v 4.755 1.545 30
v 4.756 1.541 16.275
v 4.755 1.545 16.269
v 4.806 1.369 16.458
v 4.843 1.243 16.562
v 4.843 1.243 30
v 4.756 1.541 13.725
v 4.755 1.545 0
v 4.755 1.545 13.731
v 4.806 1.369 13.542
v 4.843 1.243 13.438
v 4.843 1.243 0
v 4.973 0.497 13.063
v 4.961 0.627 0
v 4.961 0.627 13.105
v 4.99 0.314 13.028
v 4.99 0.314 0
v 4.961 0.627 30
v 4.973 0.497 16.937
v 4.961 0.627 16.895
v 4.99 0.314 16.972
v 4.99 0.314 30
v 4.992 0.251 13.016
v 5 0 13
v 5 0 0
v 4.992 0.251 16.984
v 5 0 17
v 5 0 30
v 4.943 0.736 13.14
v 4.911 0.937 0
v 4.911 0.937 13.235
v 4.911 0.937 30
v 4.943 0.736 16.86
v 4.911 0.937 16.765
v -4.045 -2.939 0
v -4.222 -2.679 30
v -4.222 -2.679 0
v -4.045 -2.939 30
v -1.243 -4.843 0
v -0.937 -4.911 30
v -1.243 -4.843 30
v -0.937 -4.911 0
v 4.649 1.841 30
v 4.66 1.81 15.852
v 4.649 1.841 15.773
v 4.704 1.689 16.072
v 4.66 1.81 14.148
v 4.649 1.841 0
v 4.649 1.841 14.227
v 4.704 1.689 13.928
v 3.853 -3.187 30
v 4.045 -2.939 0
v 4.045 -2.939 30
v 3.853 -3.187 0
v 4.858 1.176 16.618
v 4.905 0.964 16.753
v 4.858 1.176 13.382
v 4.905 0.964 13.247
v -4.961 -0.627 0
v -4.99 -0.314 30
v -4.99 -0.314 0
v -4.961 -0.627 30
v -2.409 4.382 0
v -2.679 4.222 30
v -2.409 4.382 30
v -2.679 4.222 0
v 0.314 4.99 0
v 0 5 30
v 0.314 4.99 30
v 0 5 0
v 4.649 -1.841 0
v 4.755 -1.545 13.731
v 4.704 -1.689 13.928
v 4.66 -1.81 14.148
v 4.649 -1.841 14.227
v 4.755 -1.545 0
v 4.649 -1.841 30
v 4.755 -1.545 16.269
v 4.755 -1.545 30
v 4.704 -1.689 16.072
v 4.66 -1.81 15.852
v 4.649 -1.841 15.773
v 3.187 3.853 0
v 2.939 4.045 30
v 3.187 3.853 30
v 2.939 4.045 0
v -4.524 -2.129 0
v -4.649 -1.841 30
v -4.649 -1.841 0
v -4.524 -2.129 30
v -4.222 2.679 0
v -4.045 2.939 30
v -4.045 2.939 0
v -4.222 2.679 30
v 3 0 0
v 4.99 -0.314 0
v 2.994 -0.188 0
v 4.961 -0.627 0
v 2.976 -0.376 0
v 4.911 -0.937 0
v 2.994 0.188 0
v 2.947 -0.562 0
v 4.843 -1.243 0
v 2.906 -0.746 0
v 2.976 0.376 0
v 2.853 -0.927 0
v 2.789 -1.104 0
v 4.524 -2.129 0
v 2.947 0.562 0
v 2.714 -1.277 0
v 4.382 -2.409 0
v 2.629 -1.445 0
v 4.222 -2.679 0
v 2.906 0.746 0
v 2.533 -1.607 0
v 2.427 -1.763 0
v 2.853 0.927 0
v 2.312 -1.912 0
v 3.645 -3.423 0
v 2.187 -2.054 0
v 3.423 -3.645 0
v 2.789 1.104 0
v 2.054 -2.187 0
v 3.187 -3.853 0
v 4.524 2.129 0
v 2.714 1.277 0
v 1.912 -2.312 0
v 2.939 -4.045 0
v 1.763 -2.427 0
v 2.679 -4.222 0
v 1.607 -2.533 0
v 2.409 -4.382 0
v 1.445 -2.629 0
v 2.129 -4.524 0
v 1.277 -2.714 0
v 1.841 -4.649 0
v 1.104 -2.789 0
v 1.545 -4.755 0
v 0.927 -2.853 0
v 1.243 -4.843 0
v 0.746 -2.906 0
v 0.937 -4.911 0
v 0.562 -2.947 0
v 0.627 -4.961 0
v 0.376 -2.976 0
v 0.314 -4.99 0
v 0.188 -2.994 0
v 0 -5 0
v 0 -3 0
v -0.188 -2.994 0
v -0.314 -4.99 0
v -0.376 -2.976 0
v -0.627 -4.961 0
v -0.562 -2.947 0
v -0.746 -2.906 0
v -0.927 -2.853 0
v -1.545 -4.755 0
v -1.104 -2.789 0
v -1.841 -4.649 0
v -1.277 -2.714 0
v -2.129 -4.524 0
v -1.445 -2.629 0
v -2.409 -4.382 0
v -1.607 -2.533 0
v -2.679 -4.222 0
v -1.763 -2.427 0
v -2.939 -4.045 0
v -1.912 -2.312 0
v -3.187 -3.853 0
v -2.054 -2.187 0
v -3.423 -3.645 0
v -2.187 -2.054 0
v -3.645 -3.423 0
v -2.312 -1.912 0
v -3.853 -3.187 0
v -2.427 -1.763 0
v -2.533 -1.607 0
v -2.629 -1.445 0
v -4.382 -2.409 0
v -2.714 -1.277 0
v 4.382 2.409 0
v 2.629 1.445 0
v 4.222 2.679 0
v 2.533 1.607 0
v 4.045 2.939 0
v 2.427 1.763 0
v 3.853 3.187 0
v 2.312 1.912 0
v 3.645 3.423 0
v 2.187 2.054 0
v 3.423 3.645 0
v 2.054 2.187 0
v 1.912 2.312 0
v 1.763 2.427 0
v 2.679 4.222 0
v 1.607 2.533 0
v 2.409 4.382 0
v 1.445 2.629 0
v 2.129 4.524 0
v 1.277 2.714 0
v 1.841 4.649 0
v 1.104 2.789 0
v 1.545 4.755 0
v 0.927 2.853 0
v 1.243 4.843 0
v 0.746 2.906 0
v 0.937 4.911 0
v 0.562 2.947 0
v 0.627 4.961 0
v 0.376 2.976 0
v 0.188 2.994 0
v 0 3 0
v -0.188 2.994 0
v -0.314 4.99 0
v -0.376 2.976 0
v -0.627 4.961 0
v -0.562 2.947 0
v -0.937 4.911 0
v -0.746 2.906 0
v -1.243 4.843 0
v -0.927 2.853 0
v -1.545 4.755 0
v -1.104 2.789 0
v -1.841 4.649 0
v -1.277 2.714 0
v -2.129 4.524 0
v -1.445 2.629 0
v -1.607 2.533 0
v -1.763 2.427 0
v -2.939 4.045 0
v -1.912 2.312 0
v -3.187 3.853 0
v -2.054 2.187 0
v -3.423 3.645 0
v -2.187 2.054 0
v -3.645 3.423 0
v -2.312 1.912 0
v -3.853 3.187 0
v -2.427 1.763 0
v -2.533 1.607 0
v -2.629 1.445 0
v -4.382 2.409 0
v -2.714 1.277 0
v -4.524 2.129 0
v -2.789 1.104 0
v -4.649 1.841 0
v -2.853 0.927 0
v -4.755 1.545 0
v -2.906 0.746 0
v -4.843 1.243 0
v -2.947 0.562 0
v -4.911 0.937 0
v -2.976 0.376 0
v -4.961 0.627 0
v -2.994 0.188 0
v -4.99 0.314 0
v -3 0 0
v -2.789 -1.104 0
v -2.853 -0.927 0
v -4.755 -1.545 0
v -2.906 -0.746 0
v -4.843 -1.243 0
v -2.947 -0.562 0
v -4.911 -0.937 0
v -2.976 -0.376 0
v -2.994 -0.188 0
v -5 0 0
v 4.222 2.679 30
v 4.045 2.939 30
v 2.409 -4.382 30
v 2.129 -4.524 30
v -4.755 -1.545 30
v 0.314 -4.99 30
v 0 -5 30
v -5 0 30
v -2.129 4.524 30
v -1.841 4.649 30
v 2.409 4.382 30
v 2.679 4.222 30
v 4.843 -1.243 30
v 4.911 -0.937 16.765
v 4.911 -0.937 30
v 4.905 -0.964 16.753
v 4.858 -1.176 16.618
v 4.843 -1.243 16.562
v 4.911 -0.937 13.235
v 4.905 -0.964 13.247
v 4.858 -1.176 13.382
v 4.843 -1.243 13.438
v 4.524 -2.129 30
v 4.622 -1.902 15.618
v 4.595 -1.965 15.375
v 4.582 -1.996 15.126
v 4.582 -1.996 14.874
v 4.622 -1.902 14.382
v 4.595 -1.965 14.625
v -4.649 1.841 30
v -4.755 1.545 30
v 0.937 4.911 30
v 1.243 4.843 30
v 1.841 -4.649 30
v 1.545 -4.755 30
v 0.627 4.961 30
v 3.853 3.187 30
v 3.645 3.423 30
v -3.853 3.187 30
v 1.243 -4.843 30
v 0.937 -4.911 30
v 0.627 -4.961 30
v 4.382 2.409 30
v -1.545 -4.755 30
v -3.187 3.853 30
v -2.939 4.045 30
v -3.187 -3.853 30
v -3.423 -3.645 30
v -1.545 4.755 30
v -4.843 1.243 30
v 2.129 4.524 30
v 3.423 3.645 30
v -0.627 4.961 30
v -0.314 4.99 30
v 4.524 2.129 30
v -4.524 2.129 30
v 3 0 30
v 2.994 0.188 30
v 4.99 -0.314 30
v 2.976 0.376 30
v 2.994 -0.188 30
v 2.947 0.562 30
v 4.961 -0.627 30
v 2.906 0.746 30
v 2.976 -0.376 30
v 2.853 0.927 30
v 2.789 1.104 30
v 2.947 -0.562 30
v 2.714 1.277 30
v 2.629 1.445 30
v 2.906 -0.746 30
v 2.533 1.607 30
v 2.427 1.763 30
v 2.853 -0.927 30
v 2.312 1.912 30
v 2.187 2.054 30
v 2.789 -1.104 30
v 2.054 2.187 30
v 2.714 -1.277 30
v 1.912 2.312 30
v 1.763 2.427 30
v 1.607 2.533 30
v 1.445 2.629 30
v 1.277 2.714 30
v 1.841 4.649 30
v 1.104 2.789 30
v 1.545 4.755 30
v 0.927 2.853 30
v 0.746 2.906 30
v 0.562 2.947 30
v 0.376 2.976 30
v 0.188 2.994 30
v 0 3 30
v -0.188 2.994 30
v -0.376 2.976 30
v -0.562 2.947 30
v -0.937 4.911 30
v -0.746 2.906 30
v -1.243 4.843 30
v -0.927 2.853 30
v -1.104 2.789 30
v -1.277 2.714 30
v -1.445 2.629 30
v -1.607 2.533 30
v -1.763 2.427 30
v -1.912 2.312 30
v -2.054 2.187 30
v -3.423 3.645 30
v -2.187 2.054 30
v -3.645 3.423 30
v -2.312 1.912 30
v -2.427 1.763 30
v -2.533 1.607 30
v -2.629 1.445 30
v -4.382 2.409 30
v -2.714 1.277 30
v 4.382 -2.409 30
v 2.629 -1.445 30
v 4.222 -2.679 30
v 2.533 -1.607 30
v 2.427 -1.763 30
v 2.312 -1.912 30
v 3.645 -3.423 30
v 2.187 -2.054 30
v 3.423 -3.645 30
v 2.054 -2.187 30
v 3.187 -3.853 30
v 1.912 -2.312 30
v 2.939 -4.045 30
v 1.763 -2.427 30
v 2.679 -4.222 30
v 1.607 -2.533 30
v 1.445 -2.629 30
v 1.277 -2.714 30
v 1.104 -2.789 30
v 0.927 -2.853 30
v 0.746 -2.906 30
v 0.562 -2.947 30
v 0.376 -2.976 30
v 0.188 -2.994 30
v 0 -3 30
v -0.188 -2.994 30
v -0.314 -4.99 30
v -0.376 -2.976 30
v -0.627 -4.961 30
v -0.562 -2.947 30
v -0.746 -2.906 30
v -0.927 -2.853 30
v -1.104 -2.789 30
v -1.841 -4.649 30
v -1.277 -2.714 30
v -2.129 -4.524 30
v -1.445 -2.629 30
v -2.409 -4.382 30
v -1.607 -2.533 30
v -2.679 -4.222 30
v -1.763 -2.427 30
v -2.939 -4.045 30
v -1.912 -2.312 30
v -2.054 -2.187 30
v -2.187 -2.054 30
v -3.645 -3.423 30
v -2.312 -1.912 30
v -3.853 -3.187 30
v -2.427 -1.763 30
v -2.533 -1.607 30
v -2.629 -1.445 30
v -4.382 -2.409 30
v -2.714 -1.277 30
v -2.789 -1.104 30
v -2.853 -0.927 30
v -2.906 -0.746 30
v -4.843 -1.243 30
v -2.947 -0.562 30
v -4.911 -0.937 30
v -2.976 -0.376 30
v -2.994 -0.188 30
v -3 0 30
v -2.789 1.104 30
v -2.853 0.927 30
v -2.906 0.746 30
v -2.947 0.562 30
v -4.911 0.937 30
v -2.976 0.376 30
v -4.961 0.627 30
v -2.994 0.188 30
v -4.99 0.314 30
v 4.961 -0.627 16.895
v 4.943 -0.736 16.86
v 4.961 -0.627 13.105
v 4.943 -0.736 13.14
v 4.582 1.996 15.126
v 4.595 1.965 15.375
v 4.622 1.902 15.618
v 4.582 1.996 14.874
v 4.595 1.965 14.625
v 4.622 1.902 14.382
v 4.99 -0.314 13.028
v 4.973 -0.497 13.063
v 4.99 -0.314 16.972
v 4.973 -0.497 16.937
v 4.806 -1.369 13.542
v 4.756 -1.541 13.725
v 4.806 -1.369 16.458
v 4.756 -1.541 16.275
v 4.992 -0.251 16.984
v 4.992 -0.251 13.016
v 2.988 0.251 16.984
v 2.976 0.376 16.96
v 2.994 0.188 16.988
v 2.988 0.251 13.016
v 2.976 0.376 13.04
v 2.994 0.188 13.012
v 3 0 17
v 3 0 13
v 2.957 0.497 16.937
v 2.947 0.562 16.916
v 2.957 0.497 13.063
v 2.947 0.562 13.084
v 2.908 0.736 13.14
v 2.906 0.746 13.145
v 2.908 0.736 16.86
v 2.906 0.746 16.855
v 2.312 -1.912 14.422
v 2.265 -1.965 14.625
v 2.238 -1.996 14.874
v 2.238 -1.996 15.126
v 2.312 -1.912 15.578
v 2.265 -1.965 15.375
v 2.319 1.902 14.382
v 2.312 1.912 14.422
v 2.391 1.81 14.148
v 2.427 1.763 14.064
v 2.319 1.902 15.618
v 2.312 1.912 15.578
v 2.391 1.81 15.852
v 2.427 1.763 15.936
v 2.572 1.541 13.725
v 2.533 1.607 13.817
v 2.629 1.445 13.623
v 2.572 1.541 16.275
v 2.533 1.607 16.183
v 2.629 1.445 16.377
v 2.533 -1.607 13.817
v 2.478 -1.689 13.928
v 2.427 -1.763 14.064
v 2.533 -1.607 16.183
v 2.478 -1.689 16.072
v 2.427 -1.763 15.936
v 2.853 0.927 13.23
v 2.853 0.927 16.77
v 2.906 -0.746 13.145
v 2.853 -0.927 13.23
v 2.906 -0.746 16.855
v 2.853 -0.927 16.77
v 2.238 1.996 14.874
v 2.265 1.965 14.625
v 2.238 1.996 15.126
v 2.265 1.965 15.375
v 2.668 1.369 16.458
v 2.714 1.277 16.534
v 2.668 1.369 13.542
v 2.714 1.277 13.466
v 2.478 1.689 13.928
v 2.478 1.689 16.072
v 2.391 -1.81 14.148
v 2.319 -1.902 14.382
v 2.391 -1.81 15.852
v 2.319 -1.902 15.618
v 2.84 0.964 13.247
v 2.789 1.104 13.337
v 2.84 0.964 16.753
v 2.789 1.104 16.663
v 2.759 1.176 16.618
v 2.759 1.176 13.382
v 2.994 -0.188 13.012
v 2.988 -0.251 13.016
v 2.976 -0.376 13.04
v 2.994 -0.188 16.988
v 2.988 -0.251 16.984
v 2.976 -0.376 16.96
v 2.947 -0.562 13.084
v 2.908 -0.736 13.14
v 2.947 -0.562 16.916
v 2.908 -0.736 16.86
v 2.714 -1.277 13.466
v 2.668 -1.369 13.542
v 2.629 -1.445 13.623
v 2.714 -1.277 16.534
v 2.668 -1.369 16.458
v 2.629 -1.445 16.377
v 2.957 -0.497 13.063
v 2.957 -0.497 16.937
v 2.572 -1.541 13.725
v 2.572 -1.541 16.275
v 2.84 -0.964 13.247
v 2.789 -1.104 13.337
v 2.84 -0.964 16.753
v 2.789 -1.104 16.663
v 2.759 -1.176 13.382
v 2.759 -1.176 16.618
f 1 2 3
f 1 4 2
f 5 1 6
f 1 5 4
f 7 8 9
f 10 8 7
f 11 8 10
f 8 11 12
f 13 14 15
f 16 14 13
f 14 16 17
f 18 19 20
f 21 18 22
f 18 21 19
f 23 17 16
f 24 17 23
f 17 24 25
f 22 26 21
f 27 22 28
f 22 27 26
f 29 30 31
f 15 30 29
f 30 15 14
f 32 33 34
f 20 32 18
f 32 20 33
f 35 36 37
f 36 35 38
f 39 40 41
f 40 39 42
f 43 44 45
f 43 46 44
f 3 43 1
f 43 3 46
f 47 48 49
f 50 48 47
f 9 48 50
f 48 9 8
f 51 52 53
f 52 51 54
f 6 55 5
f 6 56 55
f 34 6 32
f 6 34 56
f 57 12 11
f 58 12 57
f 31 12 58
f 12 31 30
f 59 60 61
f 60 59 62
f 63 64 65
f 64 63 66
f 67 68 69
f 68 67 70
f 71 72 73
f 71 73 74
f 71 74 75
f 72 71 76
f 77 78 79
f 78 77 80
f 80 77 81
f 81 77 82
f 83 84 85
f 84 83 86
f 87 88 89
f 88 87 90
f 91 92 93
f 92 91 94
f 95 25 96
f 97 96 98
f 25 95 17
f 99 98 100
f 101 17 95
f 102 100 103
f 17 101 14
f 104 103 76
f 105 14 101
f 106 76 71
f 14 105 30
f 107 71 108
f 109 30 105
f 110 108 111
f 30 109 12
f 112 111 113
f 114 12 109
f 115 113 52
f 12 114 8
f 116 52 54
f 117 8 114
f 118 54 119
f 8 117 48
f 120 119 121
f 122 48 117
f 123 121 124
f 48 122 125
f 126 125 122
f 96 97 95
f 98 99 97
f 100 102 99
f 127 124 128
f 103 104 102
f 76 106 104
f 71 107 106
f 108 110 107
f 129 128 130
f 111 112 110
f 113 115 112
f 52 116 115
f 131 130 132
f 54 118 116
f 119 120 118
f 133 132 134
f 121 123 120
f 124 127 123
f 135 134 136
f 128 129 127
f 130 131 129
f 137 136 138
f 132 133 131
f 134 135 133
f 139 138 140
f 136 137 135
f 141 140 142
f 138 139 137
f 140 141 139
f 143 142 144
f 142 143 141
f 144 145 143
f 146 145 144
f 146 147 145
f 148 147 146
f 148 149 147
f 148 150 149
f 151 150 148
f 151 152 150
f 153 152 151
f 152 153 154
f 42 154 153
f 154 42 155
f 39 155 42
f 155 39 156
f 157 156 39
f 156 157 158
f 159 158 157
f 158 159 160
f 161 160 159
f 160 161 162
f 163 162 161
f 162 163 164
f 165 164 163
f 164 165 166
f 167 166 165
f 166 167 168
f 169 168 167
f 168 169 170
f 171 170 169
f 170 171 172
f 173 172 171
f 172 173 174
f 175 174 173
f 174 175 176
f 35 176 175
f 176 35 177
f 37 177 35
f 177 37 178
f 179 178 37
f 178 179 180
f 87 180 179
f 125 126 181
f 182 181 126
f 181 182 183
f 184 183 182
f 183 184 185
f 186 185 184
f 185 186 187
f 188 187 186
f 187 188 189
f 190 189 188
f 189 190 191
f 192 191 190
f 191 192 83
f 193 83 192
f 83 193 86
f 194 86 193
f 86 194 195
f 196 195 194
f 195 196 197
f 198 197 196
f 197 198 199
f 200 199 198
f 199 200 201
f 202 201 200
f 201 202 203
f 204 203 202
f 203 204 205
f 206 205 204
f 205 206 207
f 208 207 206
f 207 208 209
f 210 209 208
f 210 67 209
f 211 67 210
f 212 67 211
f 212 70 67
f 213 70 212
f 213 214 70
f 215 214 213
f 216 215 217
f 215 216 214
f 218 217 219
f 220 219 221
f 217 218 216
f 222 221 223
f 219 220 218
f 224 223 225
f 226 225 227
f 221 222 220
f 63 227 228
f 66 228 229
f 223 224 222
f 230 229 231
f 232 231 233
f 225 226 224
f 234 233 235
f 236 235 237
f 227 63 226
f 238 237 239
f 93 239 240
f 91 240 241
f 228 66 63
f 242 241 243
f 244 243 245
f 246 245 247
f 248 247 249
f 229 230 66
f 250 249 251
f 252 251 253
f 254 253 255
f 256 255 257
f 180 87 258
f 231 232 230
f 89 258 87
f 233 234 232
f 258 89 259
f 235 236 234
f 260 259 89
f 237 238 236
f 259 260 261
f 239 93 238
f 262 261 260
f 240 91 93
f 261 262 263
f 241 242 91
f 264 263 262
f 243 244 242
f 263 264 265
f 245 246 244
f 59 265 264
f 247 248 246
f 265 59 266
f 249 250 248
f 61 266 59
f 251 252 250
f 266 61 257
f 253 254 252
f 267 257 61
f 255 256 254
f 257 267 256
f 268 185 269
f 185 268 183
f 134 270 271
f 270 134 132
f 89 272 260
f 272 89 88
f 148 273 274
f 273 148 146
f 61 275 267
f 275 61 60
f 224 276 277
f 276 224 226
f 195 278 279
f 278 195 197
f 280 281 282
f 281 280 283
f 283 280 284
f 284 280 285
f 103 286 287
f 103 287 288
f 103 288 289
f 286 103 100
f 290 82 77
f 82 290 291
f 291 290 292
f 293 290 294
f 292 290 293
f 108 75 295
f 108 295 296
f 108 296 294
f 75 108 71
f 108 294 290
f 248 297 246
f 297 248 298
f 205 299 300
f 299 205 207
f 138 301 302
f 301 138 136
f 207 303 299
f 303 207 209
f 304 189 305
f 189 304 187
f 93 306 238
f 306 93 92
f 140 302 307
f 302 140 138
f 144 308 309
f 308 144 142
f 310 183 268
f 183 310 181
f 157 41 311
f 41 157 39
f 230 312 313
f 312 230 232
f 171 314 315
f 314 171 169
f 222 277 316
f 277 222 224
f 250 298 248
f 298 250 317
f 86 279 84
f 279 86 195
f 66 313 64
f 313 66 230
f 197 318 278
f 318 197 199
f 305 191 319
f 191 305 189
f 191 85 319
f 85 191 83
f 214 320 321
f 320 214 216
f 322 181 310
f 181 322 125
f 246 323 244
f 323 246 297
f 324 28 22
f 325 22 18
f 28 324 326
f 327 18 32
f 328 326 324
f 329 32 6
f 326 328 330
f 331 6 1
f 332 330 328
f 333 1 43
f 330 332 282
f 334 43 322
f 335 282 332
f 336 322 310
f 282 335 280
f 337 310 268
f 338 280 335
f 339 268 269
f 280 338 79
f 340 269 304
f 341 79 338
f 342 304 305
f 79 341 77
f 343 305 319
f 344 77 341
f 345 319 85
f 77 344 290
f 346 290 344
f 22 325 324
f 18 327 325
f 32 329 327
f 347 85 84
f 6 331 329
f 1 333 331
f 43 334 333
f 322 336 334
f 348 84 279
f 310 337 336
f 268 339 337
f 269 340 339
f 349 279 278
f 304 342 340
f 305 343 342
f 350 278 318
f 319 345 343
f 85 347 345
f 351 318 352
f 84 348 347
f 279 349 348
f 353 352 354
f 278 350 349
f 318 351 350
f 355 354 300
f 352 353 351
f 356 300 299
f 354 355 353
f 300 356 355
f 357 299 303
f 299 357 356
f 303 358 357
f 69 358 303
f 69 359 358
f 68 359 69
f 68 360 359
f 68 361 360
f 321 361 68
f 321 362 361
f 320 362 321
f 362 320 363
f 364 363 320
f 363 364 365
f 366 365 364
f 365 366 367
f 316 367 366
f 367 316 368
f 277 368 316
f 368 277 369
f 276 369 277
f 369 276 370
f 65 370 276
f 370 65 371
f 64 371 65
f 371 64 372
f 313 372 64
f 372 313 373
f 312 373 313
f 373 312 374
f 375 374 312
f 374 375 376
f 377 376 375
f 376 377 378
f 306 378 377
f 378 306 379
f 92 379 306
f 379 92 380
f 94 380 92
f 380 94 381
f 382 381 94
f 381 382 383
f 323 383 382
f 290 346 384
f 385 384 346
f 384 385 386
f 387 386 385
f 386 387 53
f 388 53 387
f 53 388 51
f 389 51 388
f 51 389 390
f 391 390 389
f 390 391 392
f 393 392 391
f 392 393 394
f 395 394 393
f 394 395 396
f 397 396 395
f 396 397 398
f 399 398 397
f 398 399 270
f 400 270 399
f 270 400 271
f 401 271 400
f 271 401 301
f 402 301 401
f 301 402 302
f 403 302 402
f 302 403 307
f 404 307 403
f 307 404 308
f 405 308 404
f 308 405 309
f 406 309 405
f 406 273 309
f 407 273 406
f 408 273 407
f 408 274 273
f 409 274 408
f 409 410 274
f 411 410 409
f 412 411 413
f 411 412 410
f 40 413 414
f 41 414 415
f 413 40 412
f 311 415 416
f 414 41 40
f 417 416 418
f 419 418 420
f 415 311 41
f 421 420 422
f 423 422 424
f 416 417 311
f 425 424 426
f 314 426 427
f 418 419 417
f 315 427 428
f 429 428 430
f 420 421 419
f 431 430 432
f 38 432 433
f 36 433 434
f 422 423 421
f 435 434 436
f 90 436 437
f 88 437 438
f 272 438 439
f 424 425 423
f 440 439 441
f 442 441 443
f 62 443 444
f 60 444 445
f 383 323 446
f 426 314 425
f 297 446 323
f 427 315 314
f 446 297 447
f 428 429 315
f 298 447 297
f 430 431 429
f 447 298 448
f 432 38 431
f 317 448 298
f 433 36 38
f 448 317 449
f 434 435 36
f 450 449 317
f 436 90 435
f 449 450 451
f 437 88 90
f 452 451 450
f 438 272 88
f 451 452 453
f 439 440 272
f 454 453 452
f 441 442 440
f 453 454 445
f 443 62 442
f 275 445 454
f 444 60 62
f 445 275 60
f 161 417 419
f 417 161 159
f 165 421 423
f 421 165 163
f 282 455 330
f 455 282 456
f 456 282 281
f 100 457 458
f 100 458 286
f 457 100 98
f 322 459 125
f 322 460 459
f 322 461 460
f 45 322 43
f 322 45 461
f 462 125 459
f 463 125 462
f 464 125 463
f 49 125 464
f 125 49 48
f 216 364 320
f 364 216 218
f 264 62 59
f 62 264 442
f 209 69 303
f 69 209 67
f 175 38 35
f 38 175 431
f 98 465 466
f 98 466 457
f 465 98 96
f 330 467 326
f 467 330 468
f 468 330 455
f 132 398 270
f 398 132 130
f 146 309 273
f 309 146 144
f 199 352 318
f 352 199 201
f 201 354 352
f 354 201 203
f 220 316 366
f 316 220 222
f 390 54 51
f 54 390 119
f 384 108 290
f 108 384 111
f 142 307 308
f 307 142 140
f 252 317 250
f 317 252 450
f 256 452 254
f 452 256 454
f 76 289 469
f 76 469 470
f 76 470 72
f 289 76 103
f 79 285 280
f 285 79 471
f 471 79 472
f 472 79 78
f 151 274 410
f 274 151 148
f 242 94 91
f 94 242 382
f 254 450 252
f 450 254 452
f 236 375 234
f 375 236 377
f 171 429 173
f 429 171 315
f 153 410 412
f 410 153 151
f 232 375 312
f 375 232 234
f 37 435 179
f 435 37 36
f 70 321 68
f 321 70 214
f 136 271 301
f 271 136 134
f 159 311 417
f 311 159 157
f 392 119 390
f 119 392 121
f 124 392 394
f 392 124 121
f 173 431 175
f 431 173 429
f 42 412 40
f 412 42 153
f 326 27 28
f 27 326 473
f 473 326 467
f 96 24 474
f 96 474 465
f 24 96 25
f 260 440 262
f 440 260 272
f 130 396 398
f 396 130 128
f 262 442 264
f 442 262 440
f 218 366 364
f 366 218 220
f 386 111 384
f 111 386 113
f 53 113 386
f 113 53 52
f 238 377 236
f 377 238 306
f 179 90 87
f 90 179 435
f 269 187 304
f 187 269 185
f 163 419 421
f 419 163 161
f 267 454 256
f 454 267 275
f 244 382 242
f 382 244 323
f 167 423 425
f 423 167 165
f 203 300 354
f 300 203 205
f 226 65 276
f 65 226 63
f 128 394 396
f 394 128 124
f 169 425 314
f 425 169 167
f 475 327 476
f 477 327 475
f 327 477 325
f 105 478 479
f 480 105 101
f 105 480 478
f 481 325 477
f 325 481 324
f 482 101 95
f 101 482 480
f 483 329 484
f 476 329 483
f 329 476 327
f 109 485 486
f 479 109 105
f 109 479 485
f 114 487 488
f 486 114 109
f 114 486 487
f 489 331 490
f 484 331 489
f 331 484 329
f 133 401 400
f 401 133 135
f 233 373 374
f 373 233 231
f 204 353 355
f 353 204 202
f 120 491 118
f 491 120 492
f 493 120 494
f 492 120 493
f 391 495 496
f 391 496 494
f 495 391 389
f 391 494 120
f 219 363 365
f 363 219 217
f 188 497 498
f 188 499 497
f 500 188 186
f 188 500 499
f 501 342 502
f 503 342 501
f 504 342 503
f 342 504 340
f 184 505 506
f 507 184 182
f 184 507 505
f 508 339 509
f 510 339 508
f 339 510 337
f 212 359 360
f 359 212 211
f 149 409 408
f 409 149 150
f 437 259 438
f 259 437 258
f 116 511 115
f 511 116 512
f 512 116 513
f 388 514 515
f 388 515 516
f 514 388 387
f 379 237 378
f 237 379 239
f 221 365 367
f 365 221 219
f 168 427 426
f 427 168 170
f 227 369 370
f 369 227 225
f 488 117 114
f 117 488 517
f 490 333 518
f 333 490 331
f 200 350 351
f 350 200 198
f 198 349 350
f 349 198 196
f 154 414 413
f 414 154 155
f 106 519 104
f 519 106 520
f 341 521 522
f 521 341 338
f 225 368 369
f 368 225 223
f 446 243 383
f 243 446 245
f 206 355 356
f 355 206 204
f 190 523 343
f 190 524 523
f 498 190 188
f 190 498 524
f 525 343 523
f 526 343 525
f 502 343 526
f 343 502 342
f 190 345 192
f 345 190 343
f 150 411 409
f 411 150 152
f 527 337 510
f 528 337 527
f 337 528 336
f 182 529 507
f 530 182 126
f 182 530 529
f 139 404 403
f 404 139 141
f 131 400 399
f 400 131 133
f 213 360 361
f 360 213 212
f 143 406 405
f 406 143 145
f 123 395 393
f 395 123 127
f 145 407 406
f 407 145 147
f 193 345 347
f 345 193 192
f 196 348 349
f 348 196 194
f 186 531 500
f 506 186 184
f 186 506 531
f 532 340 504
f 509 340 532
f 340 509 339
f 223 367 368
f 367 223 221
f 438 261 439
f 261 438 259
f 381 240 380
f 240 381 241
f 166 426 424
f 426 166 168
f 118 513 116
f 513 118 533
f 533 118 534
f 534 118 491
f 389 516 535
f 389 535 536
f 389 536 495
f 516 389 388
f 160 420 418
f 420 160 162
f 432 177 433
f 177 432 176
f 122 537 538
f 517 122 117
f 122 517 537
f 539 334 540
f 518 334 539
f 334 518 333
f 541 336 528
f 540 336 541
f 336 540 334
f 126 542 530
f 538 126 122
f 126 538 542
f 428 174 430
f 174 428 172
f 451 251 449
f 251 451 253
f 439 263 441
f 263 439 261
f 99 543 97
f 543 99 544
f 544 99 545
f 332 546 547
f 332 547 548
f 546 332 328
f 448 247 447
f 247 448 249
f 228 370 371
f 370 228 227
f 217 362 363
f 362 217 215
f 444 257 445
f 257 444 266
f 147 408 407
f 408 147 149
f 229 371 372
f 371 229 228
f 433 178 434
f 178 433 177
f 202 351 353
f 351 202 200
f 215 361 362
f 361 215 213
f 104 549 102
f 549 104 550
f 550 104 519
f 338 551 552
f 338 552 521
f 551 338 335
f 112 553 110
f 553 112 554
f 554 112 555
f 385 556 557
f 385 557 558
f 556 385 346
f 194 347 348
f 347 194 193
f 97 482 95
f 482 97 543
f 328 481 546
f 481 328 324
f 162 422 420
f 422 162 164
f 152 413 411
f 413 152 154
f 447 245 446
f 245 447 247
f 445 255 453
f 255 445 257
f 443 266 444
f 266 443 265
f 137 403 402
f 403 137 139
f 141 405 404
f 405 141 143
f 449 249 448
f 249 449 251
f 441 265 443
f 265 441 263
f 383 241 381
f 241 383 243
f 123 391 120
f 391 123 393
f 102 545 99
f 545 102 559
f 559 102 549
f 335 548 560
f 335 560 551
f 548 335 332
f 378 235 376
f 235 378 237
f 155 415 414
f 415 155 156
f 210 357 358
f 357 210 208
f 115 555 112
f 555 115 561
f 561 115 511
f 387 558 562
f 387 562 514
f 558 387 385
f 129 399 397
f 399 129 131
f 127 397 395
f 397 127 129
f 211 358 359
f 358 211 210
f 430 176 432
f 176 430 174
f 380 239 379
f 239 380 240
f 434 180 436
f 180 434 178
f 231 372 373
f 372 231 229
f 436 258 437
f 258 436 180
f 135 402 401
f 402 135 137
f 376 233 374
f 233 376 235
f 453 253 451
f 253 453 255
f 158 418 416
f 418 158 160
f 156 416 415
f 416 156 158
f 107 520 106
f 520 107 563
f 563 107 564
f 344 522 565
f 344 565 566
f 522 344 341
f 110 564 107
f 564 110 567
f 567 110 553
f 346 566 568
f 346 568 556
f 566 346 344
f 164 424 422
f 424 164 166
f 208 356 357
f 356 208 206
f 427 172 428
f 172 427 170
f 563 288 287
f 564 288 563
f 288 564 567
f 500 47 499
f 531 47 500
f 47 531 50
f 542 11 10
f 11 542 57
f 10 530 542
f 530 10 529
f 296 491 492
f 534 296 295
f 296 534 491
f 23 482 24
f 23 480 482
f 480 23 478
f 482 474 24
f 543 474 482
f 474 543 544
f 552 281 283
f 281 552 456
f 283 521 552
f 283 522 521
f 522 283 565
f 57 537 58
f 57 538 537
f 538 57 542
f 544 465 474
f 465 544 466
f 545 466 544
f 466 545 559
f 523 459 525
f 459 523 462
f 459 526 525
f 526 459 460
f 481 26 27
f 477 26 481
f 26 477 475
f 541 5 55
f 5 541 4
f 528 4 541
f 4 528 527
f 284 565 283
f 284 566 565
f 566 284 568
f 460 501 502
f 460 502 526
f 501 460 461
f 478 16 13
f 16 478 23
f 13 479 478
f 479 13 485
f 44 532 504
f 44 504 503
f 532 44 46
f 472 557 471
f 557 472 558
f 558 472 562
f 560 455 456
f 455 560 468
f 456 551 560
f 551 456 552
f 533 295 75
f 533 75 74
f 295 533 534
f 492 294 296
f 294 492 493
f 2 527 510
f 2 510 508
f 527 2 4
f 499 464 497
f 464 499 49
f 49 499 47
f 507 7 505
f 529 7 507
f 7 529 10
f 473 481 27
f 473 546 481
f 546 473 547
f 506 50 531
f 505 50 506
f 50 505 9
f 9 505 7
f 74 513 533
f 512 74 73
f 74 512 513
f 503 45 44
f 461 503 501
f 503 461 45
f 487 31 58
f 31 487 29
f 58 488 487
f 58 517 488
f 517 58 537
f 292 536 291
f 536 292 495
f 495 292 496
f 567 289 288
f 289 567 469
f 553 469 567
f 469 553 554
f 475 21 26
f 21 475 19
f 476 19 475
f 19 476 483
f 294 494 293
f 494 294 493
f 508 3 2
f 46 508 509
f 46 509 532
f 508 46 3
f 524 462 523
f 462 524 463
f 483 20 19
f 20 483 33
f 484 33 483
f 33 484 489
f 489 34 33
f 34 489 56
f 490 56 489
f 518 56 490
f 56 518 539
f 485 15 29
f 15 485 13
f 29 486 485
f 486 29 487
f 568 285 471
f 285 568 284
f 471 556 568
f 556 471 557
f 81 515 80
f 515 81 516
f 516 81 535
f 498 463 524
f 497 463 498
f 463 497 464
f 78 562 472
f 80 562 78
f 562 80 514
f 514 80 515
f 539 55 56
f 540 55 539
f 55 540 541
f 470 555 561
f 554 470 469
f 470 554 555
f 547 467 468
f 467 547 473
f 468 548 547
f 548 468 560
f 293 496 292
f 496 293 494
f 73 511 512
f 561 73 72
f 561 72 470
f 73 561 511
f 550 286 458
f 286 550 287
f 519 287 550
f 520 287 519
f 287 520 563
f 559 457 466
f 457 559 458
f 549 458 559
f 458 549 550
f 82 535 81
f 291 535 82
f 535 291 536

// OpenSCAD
// Parámetros
acople_largo = 30;         // Largo total del acople
acople_diametro = 10;      // Diámetro externo
varilla_diametro = 6;      // Diámetro de la varilla a insertar
orificio_tornillo = 4;     // Orificio para tornillo pasante (M4)

// Cuerpo del acople
difference() {
    // Cilindro principal
    cylinder(h = acople_largo, d = acople_diametro, $fn = 100);

    // Hueco para la varilla
    translate([0, 0, 0])
        cylinder(h = acople_largo, d = varilla_diametro, $fn = 100);

    // Orificio pasante lateral para tornillo
    rotate([0, 90, 0])
        translate([-acople_largo/2, 0, 0])
            cylinder(h = acople_diametro + 2, d = orificio_tornillo, $fn = 50);
}
